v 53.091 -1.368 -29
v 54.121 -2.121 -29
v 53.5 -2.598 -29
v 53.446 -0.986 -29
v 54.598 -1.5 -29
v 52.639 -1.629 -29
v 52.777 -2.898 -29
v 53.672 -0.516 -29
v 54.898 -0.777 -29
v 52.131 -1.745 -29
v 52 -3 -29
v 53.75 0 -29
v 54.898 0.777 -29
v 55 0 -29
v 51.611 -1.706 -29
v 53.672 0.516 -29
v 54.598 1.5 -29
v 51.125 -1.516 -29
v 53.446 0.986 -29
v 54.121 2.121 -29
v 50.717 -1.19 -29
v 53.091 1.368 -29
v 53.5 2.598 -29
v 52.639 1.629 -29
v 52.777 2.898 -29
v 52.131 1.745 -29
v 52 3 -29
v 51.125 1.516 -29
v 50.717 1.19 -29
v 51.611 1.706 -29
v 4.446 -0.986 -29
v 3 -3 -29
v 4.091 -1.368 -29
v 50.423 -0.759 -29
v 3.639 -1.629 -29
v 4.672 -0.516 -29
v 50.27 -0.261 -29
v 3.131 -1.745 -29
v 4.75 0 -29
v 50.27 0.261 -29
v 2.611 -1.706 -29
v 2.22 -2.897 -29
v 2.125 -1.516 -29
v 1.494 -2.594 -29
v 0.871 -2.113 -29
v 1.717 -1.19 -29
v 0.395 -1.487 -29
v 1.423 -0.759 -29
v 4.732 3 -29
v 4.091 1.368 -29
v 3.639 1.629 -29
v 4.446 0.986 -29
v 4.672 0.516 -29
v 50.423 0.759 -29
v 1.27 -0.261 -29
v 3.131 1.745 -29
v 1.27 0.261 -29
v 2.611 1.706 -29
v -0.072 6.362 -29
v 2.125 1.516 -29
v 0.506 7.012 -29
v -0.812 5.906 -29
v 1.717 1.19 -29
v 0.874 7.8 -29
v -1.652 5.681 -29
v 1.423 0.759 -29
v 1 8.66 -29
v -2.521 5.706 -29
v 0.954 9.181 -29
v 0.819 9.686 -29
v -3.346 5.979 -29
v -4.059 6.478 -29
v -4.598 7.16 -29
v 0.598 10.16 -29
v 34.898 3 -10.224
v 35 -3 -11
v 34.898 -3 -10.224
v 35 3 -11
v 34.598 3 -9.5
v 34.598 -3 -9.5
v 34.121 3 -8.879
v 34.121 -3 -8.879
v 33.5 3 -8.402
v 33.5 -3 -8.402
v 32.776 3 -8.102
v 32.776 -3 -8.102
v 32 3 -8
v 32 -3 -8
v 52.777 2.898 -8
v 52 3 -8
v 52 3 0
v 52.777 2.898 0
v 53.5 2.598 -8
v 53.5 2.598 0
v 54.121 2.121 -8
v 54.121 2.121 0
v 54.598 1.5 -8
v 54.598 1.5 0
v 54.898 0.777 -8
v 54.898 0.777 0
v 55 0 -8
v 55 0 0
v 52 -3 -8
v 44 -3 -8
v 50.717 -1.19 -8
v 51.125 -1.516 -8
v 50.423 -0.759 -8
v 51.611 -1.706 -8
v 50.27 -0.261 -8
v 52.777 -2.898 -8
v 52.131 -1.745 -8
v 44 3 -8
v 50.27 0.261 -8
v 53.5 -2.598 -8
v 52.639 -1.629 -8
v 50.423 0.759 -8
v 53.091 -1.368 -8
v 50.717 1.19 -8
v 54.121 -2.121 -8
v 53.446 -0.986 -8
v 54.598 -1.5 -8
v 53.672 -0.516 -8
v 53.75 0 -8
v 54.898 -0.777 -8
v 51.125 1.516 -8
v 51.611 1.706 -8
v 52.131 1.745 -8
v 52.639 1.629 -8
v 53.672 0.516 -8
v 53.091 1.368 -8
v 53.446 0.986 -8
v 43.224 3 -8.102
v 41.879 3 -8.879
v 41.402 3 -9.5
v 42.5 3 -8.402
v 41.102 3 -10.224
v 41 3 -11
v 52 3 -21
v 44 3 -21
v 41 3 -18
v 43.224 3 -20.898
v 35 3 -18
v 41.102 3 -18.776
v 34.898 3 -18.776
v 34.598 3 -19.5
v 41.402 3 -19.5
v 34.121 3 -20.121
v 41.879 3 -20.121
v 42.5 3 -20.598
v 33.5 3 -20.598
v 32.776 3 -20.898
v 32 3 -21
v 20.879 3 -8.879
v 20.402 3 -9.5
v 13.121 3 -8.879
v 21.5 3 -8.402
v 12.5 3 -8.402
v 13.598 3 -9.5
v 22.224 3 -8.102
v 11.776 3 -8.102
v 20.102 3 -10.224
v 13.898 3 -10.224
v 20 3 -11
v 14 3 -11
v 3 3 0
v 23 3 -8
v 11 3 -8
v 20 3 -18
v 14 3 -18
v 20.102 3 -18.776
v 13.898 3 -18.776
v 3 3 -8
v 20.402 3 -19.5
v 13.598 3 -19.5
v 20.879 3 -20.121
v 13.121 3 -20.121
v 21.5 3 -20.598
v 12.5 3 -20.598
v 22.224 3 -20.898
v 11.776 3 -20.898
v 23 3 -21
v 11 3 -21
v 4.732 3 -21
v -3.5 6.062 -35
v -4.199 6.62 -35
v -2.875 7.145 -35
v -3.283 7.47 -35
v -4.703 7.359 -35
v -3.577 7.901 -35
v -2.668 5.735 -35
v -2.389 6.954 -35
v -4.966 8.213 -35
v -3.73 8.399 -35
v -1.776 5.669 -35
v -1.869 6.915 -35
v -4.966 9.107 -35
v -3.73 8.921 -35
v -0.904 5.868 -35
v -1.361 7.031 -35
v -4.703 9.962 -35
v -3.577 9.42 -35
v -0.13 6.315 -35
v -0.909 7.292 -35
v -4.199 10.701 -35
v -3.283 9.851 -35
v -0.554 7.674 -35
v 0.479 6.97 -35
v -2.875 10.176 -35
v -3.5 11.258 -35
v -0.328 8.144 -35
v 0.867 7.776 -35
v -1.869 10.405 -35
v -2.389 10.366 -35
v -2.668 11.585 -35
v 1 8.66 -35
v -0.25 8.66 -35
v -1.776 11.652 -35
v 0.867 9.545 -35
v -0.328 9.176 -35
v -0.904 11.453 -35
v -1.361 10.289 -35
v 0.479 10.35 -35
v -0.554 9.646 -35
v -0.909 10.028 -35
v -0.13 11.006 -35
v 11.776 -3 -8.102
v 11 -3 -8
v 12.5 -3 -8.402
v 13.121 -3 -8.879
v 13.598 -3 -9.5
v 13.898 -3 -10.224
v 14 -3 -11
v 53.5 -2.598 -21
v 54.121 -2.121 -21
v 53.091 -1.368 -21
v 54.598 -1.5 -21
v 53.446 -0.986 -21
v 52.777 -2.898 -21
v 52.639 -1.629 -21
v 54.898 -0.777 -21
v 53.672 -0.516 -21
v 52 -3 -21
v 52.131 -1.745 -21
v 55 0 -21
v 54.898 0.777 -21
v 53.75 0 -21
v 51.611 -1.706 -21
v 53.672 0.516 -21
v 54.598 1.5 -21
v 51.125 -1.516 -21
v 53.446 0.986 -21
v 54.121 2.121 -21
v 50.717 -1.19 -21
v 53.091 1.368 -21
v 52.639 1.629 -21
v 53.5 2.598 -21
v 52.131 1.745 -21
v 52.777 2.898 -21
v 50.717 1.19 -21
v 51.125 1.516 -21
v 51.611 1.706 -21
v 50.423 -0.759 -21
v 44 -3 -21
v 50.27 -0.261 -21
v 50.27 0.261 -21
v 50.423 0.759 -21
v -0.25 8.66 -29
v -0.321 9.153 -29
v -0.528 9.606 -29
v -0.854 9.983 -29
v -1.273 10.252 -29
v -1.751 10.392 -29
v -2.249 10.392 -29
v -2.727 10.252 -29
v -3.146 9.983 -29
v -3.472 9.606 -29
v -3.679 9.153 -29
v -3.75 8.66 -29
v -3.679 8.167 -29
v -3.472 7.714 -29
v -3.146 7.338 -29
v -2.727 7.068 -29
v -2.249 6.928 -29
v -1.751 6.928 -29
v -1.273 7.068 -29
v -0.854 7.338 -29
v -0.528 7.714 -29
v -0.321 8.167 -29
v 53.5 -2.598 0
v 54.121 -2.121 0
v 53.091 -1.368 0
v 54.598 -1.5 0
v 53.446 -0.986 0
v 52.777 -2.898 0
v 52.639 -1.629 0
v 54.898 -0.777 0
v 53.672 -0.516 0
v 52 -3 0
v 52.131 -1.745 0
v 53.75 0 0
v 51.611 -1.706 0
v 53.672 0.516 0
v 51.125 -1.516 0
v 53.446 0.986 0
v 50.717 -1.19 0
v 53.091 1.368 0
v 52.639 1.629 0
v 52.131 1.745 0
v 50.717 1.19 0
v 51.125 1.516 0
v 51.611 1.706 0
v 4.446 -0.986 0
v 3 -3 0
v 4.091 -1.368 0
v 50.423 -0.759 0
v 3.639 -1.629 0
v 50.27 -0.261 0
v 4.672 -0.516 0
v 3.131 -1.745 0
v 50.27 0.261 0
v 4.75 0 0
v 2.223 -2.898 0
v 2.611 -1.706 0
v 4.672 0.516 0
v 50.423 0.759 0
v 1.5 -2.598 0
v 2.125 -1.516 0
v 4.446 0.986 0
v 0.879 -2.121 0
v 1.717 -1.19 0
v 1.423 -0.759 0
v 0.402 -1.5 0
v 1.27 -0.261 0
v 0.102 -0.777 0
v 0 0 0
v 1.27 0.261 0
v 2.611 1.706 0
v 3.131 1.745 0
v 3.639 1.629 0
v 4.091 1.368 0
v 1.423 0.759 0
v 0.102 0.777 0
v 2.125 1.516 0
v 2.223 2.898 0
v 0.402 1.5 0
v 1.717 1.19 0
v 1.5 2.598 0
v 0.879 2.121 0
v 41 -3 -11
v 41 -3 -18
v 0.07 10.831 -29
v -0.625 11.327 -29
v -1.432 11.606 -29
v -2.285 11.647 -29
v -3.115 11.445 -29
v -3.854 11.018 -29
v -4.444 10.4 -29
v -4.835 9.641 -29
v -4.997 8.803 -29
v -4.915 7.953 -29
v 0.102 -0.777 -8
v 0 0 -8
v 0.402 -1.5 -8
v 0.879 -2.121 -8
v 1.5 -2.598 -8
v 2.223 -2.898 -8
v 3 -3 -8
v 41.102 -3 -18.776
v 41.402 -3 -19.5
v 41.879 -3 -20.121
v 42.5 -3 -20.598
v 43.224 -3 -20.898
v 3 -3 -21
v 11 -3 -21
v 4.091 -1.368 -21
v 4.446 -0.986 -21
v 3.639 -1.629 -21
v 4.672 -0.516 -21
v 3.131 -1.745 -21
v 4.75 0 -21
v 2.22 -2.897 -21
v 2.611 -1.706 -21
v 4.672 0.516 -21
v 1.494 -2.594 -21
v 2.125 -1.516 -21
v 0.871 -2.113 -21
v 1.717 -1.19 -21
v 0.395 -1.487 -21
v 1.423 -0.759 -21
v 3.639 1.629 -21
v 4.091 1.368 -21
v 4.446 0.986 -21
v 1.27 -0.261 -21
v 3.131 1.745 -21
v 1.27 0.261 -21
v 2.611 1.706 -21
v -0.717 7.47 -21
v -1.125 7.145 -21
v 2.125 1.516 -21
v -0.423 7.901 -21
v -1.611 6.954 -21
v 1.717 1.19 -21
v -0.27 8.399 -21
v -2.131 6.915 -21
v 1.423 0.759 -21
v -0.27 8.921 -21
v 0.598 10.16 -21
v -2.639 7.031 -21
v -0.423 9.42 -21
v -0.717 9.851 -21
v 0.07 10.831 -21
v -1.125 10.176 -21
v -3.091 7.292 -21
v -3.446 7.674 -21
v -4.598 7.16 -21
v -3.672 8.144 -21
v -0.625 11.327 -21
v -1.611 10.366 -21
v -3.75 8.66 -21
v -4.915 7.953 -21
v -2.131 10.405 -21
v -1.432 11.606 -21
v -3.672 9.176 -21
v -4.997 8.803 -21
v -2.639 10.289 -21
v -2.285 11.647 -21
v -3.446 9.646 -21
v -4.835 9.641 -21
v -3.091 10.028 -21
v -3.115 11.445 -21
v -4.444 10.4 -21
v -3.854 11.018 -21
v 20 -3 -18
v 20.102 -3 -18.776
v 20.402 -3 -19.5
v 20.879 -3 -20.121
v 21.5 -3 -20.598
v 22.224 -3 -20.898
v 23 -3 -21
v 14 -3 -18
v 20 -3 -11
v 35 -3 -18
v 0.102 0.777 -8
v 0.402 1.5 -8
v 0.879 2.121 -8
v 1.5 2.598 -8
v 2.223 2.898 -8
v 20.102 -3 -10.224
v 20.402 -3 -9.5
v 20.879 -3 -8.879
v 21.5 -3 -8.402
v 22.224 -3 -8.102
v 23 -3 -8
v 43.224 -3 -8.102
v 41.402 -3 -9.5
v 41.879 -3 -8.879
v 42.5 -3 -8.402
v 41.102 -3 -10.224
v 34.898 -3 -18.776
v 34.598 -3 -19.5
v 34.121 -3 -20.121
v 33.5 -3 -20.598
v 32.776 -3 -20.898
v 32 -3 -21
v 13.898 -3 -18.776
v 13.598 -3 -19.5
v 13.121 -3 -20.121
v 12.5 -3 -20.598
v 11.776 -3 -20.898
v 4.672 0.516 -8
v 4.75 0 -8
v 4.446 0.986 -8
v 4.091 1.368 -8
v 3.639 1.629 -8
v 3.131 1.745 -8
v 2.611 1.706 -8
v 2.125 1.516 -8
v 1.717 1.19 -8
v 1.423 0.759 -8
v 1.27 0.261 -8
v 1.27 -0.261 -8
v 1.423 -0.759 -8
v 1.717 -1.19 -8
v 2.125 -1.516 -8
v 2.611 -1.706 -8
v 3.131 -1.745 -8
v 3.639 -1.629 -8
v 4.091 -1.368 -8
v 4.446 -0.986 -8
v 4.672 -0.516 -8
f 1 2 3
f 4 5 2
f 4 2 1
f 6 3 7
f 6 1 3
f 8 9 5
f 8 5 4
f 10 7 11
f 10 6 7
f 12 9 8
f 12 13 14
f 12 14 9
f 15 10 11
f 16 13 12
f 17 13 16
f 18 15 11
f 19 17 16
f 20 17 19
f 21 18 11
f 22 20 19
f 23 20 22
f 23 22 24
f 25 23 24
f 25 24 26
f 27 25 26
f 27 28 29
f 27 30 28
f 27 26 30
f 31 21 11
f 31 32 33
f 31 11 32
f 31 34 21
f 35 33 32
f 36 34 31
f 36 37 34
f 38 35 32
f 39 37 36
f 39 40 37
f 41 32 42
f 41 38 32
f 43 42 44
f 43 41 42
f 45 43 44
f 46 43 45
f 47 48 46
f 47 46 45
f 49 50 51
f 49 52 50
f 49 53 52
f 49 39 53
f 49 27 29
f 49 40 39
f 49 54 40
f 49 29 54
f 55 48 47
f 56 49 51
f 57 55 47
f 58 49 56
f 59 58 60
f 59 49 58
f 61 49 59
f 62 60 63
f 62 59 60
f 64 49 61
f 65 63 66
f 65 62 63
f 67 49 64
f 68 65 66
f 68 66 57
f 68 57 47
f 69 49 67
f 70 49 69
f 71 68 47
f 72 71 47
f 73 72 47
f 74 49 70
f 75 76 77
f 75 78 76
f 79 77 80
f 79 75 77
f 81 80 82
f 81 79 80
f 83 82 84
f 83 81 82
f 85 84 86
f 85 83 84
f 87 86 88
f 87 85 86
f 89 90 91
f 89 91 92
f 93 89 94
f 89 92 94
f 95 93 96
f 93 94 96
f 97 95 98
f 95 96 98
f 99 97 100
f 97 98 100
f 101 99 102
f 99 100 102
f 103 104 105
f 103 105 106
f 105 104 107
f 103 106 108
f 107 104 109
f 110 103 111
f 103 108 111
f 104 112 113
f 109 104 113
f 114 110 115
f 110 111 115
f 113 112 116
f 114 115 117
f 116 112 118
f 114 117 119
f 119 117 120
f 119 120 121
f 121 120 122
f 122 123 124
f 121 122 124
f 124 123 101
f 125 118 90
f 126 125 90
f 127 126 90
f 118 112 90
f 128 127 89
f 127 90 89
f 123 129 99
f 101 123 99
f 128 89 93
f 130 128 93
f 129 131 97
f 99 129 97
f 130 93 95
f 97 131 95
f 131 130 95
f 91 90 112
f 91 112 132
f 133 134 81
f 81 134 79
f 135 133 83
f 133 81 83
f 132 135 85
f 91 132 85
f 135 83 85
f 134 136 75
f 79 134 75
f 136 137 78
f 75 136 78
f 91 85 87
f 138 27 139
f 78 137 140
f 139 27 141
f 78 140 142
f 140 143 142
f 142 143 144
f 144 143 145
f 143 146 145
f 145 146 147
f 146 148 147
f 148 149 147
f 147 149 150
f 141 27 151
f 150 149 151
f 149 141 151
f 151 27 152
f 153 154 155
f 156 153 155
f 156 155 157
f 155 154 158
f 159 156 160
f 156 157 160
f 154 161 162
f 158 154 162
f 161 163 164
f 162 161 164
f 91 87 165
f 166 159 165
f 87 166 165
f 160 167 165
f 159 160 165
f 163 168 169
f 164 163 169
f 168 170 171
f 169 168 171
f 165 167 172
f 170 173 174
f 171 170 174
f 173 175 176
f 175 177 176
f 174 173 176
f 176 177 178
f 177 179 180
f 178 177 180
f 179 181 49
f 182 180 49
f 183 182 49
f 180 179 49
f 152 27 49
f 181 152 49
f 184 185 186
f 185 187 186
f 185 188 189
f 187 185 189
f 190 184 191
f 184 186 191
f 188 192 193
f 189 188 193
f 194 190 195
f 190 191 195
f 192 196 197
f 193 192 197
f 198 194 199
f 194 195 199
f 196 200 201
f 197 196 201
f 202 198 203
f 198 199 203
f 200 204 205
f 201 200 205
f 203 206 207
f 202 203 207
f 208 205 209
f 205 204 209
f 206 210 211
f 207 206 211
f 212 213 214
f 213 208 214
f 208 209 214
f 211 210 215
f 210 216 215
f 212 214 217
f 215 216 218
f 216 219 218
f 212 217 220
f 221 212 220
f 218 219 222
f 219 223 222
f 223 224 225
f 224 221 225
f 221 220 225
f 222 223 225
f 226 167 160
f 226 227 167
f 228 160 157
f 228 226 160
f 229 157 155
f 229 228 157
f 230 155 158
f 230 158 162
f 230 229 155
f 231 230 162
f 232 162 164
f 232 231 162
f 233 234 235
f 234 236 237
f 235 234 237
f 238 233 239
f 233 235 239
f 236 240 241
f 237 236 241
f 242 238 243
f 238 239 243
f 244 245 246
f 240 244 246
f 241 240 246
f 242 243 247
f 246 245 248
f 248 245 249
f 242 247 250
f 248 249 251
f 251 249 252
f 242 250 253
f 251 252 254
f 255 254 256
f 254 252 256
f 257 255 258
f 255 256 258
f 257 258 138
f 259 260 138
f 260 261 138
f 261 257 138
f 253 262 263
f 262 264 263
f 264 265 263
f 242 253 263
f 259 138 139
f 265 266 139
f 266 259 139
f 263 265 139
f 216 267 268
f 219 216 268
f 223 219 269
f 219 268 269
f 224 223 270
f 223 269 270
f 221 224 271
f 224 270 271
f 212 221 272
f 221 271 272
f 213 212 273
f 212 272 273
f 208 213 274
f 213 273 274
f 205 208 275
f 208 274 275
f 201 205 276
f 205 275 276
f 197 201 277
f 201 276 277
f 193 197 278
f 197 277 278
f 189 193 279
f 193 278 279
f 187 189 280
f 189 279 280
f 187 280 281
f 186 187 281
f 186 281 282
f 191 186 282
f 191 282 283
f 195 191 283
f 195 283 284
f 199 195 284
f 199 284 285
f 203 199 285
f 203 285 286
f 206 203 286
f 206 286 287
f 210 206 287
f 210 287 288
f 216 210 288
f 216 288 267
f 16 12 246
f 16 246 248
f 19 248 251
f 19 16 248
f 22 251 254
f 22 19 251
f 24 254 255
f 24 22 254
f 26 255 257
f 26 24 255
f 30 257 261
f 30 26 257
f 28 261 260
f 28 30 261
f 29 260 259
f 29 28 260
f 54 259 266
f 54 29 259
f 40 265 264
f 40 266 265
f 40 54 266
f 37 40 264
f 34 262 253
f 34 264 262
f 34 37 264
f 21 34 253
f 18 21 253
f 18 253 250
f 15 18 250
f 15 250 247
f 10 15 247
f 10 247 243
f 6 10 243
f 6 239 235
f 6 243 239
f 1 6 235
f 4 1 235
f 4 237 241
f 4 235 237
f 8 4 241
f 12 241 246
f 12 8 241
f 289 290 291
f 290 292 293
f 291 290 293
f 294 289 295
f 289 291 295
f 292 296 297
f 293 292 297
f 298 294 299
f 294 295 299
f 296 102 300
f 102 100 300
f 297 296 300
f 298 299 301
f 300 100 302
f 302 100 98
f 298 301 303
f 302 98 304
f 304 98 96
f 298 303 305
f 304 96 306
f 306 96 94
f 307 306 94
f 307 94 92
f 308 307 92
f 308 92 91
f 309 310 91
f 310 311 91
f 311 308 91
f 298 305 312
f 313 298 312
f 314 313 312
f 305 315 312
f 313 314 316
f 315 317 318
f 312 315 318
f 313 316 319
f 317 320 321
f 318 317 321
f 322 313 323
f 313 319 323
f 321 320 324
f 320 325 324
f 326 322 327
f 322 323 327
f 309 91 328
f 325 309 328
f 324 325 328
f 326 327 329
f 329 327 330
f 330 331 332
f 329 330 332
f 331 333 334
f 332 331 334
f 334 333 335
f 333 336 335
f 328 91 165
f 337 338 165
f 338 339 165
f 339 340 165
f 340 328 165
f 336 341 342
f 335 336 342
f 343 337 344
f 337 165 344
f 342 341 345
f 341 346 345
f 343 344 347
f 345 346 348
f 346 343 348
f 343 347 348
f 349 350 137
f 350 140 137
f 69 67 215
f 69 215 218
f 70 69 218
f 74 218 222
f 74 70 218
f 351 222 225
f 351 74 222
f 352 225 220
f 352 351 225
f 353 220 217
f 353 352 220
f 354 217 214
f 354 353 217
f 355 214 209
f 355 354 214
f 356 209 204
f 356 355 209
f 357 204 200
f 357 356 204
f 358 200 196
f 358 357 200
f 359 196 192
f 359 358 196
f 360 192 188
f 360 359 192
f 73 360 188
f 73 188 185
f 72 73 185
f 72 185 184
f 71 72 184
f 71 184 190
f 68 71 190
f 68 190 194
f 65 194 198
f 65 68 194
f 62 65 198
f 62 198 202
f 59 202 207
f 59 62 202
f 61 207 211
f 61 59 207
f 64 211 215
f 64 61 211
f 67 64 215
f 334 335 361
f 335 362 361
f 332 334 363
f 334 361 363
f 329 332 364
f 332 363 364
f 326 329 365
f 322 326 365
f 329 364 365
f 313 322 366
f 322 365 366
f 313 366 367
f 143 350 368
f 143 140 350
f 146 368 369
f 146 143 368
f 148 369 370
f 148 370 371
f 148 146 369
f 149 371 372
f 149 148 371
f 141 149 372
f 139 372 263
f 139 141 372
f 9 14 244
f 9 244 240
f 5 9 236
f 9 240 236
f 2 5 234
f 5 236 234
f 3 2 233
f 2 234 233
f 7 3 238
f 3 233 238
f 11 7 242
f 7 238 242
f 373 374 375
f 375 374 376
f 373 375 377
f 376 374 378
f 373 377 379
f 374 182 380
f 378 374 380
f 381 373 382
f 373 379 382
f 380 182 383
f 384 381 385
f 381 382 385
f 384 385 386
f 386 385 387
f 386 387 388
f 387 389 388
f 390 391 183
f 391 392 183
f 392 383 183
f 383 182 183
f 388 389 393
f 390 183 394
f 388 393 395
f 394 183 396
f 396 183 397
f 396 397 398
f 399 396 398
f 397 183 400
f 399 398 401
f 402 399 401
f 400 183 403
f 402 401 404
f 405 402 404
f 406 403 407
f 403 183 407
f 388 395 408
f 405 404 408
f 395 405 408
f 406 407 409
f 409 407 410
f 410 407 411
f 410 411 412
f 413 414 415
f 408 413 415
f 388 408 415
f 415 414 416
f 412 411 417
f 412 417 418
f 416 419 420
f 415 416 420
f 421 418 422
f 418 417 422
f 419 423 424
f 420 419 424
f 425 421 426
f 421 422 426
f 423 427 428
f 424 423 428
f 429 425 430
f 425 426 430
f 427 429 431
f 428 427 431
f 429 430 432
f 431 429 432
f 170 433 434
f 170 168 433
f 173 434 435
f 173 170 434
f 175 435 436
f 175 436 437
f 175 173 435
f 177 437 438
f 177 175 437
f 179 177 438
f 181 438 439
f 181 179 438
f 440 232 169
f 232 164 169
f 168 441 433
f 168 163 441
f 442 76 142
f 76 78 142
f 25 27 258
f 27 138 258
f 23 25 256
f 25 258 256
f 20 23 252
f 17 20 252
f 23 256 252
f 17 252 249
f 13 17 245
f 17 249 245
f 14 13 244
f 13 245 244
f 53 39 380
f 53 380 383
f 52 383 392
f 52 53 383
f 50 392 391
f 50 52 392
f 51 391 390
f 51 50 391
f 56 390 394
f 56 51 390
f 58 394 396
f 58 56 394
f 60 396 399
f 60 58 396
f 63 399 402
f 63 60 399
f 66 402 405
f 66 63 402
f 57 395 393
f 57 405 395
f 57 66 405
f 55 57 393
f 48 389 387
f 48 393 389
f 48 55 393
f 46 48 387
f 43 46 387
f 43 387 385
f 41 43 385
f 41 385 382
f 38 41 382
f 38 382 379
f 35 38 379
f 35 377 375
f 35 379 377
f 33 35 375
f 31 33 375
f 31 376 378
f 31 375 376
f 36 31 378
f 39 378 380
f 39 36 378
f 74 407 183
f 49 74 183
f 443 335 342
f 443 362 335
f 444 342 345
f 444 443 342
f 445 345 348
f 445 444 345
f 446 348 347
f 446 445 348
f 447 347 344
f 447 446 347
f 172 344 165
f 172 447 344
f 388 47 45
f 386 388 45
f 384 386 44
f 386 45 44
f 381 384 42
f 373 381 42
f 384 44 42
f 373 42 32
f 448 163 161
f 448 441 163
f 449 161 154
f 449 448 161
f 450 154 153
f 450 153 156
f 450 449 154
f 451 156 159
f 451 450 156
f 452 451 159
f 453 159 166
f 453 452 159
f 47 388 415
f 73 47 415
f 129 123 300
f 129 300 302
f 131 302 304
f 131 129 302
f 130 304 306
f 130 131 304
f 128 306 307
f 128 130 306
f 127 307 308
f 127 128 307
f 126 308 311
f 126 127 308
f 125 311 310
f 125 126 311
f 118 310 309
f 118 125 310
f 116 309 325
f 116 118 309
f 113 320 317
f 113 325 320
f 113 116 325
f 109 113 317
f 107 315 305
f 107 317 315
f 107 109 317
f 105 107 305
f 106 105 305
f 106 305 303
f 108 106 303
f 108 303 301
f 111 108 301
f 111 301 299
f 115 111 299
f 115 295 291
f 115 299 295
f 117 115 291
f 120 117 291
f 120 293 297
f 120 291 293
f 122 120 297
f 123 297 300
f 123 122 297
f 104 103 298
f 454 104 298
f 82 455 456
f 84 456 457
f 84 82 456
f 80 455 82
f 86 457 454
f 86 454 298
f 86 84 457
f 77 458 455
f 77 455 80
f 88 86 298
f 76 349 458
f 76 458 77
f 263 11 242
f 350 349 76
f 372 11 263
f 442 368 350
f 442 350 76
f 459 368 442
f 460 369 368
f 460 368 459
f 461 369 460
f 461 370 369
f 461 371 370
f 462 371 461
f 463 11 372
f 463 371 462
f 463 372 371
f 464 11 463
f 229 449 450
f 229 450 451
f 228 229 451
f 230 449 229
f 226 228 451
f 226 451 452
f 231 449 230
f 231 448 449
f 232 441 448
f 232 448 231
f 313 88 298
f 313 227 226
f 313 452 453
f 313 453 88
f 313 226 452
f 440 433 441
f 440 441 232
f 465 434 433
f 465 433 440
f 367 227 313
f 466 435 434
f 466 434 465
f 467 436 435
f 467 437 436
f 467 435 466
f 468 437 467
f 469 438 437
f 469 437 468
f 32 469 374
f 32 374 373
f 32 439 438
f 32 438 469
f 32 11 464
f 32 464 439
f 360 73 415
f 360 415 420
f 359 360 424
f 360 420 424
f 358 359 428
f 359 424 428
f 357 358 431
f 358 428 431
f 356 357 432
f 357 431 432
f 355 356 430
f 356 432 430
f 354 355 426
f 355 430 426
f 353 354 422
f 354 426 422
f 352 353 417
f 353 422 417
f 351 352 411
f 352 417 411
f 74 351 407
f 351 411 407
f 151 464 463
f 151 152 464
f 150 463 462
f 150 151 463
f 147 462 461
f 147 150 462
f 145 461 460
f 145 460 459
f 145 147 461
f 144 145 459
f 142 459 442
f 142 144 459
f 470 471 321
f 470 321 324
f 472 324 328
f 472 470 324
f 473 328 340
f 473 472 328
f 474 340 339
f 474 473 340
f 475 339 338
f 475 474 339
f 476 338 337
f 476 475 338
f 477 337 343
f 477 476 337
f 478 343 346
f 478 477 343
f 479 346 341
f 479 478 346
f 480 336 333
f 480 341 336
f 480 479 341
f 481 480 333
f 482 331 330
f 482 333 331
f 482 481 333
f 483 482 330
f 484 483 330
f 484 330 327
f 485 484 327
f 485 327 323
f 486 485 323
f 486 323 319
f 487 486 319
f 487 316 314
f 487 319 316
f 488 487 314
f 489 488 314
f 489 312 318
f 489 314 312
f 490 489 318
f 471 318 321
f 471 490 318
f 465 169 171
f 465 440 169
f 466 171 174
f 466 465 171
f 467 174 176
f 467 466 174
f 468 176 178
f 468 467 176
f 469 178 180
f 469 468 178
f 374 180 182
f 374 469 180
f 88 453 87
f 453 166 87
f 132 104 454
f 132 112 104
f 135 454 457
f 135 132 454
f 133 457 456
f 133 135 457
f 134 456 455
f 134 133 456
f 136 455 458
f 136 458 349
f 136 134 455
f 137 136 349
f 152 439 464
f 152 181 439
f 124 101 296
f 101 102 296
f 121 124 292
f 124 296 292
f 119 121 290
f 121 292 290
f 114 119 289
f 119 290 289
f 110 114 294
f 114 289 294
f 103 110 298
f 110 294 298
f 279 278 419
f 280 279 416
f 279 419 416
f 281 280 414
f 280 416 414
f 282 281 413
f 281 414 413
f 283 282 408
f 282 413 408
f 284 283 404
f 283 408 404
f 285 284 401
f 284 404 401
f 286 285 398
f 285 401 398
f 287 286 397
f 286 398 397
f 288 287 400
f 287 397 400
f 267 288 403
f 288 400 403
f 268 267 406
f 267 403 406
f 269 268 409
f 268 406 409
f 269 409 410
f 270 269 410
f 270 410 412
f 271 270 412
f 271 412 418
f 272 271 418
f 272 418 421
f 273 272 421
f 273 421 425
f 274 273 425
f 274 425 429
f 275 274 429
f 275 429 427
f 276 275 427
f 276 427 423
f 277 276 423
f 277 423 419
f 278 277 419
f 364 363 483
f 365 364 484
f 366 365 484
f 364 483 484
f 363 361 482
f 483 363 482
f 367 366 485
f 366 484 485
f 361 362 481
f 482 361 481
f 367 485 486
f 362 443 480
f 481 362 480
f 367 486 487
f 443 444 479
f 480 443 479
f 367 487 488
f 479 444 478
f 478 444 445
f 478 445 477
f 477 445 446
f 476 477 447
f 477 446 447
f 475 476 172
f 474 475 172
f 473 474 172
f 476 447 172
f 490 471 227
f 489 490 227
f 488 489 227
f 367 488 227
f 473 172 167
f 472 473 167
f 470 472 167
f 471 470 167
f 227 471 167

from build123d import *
from build123d.topology import SkipClean

# Parameters (mm, degrees)
CROQUIS1_W                 = 15
CROQUIS1_H                 = 13
SALIENTE_EXTRUIR1_DEPTH    = 3
REDONDEO1_R                = 3
CORTAR_EXTRUIR1_DEPTH      = 63.24949799
CORTAR_EXTRUIR1_DEPTH_BACK = 63.24949799
CROQUIS2_R                 = 1.75
CORTAR_EXTRUIR2_DEPTH      = 63.24949799
CORTAR_EXTRUIR2_DEPTH_BACK = 63.24949799
CROQUIS3_R                 = 1.75
REDONDEO2_R                = 3
SALIENTE_EXTRUIR2_START    = -21
CROQUIS5_R                 = 1.75
SALIENTE_EXTRUIR2_DEPTH    = 8
SALIENTE_EXTRUIR3_START    = -29
CROQUIS6_R                 = 3
CROQUIS6_R_2               = 1.75
SALIENTE_EXTRUIR3_DEPTH    = 6


with BuildPart() as part:
    # Croquis1 → Saliente-Extruir1 (new, symmetric)
    with BuildSketch(Plane(origin=(0, 0, 0), x_dir=(1, 0, 0), z_dir=(0, 1, 0))):
        Polygon((0, 0), (0, 8), (14, 8), (14, 21), (0, 21), (0, 29), (55, 29), (55, 21), (41, 21), (41, 8), (55, 8), (55, 0), align=None)
        with Locations((27.5, 14.5)):
            Rectangle(CROQUIS1_W, CROQUIS1_H, mode=Mode.SUBTRACT)
    extrude(amount=SALIENTE_EXTRUIR1_DEPTH, both=True)

    # Redondeo1
    redondeo1_edges = [part.edges().sort_by_distance(p)[0] for p in [
        (0, -3, -4),
        (0, 3, -4),
        (0, -3, -25),
        (0, 3, -25),
        (55, -3, -4),
        (55, 3, -4),
        (55, 3, -25),
        (55, -3, -25),
    ]]
    fillet(redondeo1_edges, radius=REDONDEO1_R - 0.0001)  # a hair under: the kernel refuses the full size

    # Croquis2 → Cortar-Extruir1 (cut, two sides: drawn at the far end of the back side and taken through both)
    with BuildSketch(Plane.XY.offset(-CORTAR_EXTRUIR1_DEPTH_BACK)):
        with Locations((3, 0)):
            Circle(CROQUIS2_R)
    extrude(amount=CORTAR_EXTRUIR1_DEPTH + CORTAR_EXTRUIR1_DEPTH_BACK, mode=Mode.SUBTRACT)

    # Croquis3 → Cortar-Extruir2 (cut, two sides: drawn at the far end of the back side and taken through both)
    with BuildSketch(Plane.XY.offset(-CORTAR_EXTRUIR2_DEPTH_BACK)):
        with Locations((52, 0)):
            Circle(CROQUIS3_R)
    extrude(amount=CORTAR_EXTRUIR2_DEPTH + CORTAR_EXTRUIR2_DEPTH_BACK, mode=Mode.SUBTRACT)

    # Redondeo2
    redondeo2_edges = [part.edges().sort_by_distance(p)[0] for p in [
        (14, 0, -8),
        (14, 0, -21),
        (41, 0, -21),
        (41, 0, -8),
        (20, 0, -21),
        (20, 0, -8),
        (35, 0, -8),
        (35, 0, -21),
    ]]
    fillet(redondeo2_edges, radius=REDONDEO2_R)

    # Croquis5 → Saliente-Extruir2 (add)
    with BuildSketch(Plane.XY.offset(SALIENTE_EXTRUIR2_START)):
        with BuildLine():
            Line((0.598076211, 10.160254038), (5.598076211, 1.5))
            ThreePointArc((5.598076211, 1.5), (4.5, -2.598076211), (0.401923789, -1.5))
            Line((0.401923789, -1.5), (-4.598076211, 7.160254038))
            ThreePointArc((-4.598076211, 7.160254038), (-3.5, 11.258330249), (0.598076211, 10.160254038))
        make_face()
        with Locations(Location((-2, 8.660254038, 0), (0, 0, 180))):
            Circle(CROQUIS5_R, mode=Mode.SUBTRACT)
        with Locations((3, 0)):
            Circle(CROQUIS5_R, mode=Mode.SUBTRACT)
    extrude(amount=-SALIENTE_EXTRUIR2_DEPTH)

    # Croquis6 → Saliente-Extruir3 (add)
    with SkipClean():  # the faces are left unmerged after this step: merging them gives an invalid solid
        with BuildSketch(Plane.XY.offset(SALIENTE_EXTRUIR3_START)):
            with Locations((-2, 8.660254038)):
                Circle(CROQUIS6_R)
            with Locations((-2, 8.660254038)):
                Circle(CROQUIS6_R_2, mode=Mode.SUBTRACT)
        extrude(amount=-SALIENTE_EXTRUIR3_DEPTH)


solid = part.part
